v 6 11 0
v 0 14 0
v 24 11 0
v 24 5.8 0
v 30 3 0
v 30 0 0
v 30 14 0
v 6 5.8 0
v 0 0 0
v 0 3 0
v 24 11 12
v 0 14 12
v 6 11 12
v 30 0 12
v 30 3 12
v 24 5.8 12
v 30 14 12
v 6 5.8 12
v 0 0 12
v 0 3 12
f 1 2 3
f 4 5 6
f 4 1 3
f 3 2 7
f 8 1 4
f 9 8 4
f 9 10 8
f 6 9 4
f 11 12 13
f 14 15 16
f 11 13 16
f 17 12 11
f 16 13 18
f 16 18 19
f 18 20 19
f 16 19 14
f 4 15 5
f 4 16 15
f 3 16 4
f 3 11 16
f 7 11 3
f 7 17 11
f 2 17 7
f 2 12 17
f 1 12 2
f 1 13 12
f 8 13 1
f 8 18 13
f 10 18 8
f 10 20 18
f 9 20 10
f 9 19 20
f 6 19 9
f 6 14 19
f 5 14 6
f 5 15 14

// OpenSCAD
$fn = 32;

// ----------------------------------------------------------------------
// Key bar: dovetail key, 12 mm thick
// ----------------------------------------------------------------------

// --- parameters (mm) ---
profile_height = 12;      // extrusion height
profile_points = 10;      // points of the closed outline

profile = [[0, 0], [30, 0], [30, 3], [24, 5.8], [24, 11], [30, 14], [0, 14], [6, 11], [6, 5.8], [0, 3]];  // single closed polygon, 10 points, counter clockwise

// --- the one profile operation ---
linear_extrude(height = profile_height) polygon(points = profile);
